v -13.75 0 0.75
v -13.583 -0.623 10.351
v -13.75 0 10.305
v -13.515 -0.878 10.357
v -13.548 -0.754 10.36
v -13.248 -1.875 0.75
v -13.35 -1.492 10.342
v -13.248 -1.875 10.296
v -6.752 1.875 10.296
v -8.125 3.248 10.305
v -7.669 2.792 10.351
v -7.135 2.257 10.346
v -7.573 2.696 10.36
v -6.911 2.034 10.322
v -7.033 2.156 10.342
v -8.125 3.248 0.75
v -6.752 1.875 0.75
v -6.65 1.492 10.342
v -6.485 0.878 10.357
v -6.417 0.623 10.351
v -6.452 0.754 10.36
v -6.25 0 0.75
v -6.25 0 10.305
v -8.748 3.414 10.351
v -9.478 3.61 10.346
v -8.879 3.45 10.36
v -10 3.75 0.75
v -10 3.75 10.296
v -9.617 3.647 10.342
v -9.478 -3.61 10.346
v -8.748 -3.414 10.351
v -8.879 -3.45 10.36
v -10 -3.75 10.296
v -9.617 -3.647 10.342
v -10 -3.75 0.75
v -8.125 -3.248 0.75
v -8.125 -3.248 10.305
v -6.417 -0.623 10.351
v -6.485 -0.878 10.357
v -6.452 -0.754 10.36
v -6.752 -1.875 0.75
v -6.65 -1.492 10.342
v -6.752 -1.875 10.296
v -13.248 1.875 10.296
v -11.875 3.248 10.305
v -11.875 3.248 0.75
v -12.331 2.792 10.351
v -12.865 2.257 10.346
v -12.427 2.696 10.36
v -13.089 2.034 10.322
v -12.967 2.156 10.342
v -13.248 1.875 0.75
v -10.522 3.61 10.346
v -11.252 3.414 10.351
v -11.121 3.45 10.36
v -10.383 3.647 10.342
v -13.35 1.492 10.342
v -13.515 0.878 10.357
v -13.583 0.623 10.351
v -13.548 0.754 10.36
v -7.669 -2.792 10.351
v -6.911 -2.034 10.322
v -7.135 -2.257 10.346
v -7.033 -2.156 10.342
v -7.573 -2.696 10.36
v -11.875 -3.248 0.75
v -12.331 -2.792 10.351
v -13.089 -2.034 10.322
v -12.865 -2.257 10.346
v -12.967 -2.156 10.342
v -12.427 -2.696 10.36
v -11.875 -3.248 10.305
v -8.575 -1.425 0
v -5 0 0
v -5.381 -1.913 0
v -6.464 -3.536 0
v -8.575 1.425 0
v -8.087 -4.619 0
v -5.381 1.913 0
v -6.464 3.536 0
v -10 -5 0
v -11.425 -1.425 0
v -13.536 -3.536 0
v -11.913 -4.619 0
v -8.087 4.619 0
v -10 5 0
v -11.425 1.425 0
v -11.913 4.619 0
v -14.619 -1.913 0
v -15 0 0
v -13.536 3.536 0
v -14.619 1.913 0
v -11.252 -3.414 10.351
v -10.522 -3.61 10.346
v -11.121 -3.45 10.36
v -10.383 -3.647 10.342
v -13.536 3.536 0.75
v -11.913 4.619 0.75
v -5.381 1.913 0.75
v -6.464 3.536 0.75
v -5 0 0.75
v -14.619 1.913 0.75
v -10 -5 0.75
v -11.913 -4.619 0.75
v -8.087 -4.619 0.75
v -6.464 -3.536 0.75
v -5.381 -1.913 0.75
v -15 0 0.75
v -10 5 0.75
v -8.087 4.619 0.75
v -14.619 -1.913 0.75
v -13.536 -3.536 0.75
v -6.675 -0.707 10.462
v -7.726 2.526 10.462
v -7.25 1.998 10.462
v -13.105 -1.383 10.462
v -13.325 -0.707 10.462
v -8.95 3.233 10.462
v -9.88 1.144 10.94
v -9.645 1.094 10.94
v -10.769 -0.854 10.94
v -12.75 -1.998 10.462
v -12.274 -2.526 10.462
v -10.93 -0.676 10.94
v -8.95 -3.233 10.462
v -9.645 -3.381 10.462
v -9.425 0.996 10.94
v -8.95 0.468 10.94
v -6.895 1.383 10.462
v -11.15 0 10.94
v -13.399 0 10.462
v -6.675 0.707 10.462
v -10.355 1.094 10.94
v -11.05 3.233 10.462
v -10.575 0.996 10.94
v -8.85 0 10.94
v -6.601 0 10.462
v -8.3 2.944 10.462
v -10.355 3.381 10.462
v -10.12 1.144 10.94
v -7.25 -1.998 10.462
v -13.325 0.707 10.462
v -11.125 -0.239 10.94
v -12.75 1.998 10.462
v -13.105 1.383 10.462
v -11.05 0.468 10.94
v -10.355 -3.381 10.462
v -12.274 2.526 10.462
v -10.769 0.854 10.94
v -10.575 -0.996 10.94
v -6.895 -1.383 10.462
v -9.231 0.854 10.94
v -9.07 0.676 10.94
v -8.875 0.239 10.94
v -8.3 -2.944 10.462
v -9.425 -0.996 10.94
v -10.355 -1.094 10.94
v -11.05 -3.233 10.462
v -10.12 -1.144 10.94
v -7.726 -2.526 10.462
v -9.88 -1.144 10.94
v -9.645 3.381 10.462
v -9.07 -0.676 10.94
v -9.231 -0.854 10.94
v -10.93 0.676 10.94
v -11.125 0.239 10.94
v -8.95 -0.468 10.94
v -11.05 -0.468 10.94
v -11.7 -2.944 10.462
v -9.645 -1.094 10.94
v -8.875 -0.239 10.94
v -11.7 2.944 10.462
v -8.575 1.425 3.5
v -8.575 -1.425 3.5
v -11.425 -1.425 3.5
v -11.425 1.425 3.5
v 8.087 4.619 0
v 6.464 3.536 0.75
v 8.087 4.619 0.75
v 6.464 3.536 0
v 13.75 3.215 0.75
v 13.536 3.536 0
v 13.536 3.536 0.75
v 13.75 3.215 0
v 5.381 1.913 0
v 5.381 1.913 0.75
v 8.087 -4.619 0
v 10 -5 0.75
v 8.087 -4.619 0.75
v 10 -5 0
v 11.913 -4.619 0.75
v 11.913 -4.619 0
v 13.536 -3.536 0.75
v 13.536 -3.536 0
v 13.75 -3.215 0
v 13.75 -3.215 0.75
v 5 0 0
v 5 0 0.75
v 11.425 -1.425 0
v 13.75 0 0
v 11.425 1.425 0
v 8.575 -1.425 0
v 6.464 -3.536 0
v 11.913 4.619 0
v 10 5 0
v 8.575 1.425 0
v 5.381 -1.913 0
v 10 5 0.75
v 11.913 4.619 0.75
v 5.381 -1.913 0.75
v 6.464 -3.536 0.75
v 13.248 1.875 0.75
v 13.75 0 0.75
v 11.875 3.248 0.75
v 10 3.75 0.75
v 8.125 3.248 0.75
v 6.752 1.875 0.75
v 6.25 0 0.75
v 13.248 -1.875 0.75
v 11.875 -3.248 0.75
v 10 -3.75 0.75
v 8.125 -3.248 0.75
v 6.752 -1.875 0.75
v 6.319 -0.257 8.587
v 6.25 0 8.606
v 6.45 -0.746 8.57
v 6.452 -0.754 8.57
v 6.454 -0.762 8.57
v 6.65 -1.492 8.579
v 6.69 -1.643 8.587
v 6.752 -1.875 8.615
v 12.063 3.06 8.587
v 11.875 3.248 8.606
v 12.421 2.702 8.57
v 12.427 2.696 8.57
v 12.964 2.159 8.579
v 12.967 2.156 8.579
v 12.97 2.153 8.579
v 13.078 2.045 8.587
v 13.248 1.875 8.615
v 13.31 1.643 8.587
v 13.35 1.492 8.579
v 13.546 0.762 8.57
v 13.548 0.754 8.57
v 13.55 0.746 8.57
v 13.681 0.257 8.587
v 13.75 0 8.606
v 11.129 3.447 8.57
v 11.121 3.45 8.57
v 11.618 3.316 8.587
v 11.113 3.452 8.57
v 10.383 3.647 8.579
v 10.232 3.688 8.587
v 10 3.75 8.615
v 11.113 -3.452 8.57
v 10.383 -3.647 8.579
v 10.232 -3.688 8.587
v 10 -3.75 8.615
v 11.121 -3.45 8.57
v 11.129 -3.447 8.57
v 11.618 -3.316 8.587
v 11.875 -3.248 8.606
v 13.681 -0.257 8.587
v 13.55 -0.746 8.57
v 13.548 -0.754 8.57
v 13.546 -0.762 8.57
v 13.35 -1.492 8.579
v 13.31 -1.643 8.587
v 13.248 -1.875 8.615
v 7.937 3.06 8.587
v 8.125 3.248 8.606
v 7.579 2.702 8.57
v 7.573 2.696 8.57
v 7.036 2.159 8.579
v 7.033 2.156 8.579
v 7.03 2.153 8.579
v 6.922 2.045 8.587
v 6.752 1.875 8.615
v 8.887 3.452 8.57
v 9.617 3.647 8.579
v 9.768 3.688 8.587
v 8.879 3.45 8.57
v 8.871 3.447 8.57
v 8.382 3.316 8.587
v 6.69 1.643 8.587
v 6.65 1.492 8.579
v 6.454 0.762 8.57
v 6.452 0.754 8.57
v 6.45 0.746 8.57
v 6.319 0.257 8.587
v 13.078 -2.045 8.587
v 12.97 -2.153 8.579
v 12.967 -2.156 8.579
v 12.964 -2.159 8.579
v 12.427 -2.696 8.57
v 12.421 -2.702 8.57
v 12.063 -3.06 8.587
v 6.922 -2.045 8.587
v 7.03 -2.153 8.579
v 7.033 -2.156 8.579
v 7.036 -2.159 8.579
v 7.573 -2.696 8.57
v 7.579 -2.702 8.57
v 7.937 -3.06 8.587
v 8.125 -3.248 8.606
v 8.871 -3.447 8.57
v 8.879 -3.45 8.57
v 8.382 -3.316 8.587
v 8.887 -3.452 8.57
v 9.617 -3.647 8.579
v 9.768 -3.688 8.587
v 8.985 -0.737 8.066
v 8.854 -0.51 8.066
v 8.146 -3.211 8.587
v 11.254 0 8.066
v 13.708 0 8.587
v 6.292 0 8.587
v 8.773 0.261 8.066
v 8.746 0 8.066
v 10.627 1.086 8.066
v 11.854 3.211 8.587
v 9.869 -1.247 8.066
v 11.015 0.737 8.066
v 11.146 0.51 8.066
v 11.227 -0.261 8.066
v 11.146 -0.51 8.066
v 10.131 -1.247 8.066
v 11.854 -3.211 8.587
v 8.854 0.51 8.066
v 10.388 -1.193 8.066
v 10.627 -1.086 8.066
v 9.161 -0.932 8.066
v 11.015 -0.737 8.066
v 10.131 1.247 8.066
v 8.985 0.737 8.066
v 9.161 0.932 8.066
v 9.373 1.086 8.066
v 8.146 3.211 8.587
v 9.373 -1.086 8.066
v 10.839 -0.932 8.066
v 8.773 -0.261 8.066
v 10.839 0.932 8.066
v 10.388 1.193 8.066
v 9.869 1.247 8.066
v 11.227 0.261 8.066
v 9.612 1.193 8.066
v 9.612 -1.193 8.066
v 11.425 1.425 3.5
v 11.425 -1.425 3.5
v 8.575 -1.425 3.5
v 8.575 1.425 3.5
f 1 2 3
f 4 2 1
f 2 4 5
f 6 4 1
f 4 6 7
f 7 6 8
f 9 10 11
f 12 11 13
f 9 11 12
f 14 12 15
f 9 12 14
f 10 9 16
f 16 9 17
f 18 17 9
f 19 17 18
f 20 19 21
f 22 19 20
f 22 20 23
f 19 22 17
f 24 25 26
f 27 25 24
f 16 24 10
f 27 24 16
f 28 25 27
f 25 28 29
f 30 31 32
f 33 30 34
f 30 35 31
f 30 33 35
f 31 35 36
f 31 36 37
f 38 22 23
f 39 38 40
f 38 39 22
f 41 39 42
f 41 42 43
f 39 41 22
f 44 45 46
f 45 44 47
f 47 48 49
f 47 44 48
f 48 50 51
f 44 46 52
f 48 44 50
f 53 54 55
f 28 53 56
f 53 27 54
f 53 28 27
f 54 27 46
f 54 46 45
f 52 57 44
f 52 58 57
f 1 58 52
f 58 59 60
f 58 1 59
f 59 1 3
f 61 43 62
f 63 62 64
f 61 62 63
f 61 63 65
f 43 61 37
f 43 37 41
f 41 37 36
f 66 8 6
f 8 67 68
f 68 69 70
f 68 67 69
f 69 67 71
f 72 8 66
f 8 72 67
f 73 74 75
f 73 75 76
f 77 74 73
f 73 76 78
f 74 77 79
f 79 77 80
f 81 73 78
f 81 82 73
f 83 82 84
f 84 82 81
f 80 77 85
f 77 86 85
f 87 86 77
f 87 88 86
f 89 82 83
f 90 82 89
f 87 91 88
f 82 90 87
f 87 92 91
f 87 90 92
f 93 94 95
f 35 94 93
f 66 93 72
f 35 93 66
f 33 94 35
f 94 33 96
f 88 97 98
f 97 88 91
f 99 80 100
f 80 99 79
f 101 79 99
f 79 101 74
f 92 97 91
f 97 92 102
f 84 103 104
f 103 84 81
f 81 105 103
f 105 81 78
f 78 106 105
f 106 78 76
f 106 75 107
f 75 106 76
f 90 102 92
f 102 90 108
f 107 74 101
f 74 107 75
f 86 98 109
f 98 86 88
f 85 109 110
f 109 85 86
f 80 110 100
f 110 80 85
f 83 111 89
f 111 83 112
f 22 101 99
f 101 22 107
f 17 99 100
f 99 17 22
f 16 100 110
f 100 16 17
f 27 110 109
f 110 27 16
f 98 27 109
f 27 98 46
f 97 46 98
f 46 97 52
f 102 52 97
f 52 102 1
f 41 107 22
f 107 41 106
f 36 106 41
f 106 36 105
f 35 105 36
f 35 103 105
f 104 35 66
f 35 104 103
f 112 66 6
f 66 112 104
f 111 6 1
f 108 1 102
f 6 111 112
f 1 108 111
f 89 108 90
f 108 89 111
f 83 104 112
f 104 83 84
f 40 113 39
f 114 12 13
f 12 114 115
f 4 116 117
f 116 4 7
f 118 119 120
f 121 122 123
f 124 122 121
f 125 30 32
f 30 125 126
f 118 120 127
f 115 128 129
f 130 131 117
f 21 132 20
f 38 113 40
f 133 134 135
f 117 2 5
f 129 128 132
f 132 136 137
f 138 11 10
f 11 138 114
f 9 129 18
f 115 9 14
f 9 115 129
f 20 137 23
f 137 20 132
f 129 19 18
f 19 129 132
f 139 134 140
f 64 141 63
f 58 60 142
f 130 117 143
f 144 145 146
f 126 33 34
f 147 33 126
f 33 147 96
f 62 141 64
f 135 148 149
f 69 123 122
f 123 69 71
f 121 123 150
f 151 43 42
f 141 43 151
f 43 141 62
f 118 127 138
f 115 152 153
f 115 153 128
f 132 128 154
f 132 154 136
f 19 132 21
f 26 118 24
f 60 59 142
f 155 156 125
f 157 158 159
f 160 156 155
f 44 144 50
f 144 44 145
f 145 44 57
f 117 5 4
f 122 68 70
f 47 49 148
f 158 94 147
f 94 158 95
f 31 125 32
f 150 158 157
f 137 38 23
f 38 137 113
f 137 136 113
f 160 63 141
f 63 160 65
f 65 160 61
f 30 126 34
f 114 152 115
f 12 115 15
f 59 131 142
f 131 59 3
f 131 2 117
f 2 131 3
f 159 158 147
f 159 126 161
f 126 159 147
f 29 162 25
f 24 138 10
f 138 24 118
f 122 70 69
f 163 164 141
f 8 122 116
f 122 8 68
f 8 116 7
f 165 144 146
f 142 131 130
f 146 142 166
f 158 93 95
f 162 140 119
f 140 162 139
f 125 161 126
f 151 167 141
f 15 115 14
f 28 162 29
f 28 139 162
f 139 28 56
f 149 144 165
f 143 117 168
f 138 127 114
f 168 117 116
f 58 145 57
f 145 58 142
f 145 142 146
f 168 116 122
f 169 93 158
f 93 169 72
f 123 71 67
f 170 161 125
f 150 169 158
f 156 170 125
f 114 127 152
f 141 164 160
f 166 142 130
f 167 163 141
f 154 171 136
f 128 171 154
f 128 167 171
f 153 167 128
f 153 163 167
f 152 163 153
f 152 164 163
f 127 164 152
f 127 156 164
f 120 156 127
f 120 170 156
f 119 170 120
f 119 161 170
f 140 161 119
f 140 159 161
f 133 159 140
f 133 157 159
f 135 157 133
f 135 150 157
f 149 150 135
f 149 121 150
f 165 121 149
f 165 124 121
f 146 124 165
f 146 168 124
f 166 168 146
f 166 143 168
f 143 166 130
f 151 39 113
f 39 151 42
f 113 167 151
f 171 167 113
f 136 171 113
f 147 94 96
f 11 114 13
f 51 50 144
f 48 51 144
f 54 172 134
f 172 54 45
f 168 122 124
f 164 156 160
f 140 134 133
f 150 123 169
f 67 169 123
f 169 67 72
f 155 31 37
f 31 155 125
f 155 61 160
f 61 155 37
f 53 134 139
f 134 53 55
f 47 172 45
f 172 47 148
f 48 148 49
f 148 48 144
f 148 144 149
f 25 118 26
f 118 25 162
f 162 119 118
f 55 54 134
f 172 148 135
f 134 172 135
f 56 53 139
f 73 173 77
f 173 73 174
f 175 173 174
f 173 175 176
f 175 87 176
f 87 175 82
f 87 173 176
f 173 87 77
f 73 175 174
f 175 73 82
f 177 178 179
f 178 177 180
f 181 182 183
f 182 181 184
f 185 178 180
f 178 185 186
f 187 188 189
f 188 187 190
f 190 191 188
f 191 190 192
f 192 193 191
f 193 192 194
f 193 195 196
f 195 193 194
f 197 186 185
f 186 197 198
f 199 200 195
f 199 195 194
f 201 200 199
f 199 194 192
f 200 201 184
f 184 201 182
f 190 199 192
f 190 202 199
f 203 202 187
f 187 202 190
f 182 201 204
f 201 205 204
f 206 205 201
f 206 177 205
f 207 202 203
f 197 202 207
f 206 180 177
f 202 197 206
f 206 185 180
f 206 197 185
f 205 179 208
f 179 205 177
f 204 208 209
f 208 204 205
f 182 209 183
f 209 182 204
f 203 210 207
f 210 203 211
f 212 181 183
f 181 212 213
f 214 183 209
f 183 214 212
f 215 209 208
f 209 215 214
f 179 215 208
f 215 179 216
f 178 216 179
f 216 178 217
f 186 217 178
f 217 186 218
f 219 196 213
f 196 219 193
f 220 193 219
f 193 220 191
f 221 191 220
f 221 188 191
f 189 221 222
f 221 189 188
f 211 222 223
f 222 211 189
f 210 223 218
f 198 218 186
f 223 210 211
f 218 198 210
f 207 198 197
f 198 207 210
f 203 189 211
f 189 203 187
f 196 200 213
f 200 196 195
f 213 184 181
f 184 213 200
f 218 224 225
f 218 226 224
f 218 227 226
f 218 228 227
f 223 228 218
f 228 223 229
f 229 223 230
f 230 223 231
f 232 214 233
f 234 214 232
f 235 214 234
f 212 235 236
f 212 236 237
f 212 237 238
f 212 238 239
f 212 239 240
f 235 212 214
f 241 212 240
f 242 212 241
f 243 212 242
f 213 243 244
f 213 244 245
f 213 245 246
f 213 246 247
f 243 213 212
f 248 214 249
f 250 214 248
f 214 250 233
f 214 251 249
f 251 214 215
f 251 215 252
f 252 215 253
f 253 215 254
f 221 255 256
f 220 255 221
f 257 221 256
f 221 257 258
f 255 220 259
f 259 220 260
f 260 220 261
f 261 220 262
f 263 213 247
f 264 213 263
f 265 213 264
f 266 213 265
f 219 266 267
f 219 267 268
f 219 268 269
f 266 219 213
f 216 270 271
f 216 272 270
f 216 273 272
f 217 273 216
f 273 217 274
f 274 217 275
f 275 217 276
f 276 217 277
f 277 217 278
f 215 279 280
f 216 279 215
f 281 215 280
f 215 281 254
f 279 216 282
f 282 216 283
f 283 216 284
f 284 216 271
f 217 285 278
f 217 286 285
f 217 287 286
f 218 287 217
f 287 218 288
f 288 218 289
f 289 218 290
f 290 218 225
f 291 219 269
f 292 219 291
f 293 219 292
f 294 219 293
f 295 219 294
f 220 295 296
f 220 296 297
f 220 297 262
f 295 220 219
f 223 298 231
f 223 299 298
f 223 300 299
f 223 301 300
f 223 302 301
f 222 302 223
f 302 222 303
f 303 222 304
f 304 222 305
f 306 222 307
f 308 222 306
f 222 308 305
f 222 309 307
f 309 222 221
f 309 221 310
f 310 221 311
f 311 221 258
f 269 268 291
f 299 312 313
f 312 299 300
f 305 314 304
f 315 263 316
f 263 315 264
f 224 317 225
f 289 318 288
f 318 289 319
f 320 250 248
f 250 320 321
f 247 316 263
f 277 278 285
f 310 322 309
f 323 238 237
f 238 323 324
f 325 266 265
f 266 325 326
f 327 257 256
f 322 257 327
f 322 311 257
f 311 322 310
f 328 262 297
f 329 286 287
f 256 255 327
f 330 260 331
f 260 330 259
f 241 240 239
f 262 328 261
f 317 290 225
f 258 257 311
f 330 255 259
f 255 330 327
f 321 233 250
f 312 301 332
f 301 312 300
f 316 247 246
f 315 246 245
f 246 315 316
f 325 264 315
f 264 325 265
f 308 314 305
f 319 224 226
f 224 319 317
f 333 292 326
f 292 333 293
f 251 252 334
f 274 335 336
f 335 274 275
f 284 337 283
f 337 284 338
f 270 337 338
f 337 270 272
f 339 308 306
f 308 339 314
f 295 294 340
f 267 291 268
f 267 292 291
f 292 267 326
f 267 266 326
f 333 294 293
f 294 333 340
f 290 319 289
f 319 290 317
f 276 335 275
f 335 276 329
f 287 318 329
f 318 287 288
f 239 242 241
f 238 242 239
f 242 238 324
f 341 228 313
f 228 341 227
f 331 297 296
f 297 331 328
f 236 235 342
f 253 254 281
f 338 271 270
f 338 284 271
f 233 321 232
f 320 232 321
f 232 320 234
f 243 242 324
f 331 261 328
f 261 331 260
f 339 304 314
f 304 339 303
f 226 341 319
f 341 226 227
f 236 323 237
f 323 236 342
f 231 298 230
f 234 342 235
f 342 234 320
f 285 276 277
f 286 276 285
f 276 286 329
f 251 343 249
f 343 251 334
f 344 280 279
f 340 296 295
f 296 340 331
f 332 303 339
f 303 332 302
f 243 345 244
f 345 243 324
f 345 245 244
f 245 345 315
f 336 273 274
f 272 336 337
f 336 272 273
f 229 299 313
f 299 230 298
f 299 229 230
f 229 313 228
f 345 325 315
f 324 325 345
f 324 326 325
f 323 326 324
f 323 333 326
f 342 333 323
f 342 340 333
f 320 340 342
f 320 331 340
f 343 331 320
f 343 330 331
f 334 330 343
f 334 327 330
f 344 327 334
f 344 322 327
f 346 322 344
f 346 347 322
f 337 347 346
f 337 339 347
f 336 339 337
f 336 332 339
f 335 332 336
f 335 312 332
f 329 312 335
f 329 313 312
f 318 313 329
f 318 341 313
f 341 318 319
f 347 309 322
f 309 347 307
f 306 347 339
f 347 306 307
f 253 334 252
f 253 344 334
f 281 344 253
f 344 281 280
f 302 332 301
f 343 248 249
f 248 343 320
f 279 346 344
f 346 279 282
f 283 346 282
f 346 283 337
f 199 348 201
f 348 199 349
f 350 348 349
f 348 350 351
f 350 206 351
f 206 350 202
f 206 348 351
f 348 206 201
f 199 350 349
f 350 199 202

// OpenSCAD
// typical buttons
translate([-10,0,0])
{
    difference()
    {
        intersection()
        {
            union()
            {
                cylinder(11,3.75,3.75,center=false);
                cylinder(0.75,5,5,center=false);
            }
            sphere(11);
        }
        cube([2.85,2.85,7],center=true);
       
    }
}

// reset and menu buttons
translate([10,0,0])
{
    difference()
    {
        difference()
        {
            union()
            {
                cylinder(9,3.75,3.75,center=false);
                difference()
                {
                    cylinder(0.75,5,5,center=false);
                    translate([3.75,-5,-1])
                    {
                        cube([10, 10, 10], center = false);
                    }
                }
            }
            translate([0,0,20])
            {
                sphere(12);
            }
        }
        cube([2.85,2.85,7],center=true);
       
    }
}

// no shoulder buttons yet!
